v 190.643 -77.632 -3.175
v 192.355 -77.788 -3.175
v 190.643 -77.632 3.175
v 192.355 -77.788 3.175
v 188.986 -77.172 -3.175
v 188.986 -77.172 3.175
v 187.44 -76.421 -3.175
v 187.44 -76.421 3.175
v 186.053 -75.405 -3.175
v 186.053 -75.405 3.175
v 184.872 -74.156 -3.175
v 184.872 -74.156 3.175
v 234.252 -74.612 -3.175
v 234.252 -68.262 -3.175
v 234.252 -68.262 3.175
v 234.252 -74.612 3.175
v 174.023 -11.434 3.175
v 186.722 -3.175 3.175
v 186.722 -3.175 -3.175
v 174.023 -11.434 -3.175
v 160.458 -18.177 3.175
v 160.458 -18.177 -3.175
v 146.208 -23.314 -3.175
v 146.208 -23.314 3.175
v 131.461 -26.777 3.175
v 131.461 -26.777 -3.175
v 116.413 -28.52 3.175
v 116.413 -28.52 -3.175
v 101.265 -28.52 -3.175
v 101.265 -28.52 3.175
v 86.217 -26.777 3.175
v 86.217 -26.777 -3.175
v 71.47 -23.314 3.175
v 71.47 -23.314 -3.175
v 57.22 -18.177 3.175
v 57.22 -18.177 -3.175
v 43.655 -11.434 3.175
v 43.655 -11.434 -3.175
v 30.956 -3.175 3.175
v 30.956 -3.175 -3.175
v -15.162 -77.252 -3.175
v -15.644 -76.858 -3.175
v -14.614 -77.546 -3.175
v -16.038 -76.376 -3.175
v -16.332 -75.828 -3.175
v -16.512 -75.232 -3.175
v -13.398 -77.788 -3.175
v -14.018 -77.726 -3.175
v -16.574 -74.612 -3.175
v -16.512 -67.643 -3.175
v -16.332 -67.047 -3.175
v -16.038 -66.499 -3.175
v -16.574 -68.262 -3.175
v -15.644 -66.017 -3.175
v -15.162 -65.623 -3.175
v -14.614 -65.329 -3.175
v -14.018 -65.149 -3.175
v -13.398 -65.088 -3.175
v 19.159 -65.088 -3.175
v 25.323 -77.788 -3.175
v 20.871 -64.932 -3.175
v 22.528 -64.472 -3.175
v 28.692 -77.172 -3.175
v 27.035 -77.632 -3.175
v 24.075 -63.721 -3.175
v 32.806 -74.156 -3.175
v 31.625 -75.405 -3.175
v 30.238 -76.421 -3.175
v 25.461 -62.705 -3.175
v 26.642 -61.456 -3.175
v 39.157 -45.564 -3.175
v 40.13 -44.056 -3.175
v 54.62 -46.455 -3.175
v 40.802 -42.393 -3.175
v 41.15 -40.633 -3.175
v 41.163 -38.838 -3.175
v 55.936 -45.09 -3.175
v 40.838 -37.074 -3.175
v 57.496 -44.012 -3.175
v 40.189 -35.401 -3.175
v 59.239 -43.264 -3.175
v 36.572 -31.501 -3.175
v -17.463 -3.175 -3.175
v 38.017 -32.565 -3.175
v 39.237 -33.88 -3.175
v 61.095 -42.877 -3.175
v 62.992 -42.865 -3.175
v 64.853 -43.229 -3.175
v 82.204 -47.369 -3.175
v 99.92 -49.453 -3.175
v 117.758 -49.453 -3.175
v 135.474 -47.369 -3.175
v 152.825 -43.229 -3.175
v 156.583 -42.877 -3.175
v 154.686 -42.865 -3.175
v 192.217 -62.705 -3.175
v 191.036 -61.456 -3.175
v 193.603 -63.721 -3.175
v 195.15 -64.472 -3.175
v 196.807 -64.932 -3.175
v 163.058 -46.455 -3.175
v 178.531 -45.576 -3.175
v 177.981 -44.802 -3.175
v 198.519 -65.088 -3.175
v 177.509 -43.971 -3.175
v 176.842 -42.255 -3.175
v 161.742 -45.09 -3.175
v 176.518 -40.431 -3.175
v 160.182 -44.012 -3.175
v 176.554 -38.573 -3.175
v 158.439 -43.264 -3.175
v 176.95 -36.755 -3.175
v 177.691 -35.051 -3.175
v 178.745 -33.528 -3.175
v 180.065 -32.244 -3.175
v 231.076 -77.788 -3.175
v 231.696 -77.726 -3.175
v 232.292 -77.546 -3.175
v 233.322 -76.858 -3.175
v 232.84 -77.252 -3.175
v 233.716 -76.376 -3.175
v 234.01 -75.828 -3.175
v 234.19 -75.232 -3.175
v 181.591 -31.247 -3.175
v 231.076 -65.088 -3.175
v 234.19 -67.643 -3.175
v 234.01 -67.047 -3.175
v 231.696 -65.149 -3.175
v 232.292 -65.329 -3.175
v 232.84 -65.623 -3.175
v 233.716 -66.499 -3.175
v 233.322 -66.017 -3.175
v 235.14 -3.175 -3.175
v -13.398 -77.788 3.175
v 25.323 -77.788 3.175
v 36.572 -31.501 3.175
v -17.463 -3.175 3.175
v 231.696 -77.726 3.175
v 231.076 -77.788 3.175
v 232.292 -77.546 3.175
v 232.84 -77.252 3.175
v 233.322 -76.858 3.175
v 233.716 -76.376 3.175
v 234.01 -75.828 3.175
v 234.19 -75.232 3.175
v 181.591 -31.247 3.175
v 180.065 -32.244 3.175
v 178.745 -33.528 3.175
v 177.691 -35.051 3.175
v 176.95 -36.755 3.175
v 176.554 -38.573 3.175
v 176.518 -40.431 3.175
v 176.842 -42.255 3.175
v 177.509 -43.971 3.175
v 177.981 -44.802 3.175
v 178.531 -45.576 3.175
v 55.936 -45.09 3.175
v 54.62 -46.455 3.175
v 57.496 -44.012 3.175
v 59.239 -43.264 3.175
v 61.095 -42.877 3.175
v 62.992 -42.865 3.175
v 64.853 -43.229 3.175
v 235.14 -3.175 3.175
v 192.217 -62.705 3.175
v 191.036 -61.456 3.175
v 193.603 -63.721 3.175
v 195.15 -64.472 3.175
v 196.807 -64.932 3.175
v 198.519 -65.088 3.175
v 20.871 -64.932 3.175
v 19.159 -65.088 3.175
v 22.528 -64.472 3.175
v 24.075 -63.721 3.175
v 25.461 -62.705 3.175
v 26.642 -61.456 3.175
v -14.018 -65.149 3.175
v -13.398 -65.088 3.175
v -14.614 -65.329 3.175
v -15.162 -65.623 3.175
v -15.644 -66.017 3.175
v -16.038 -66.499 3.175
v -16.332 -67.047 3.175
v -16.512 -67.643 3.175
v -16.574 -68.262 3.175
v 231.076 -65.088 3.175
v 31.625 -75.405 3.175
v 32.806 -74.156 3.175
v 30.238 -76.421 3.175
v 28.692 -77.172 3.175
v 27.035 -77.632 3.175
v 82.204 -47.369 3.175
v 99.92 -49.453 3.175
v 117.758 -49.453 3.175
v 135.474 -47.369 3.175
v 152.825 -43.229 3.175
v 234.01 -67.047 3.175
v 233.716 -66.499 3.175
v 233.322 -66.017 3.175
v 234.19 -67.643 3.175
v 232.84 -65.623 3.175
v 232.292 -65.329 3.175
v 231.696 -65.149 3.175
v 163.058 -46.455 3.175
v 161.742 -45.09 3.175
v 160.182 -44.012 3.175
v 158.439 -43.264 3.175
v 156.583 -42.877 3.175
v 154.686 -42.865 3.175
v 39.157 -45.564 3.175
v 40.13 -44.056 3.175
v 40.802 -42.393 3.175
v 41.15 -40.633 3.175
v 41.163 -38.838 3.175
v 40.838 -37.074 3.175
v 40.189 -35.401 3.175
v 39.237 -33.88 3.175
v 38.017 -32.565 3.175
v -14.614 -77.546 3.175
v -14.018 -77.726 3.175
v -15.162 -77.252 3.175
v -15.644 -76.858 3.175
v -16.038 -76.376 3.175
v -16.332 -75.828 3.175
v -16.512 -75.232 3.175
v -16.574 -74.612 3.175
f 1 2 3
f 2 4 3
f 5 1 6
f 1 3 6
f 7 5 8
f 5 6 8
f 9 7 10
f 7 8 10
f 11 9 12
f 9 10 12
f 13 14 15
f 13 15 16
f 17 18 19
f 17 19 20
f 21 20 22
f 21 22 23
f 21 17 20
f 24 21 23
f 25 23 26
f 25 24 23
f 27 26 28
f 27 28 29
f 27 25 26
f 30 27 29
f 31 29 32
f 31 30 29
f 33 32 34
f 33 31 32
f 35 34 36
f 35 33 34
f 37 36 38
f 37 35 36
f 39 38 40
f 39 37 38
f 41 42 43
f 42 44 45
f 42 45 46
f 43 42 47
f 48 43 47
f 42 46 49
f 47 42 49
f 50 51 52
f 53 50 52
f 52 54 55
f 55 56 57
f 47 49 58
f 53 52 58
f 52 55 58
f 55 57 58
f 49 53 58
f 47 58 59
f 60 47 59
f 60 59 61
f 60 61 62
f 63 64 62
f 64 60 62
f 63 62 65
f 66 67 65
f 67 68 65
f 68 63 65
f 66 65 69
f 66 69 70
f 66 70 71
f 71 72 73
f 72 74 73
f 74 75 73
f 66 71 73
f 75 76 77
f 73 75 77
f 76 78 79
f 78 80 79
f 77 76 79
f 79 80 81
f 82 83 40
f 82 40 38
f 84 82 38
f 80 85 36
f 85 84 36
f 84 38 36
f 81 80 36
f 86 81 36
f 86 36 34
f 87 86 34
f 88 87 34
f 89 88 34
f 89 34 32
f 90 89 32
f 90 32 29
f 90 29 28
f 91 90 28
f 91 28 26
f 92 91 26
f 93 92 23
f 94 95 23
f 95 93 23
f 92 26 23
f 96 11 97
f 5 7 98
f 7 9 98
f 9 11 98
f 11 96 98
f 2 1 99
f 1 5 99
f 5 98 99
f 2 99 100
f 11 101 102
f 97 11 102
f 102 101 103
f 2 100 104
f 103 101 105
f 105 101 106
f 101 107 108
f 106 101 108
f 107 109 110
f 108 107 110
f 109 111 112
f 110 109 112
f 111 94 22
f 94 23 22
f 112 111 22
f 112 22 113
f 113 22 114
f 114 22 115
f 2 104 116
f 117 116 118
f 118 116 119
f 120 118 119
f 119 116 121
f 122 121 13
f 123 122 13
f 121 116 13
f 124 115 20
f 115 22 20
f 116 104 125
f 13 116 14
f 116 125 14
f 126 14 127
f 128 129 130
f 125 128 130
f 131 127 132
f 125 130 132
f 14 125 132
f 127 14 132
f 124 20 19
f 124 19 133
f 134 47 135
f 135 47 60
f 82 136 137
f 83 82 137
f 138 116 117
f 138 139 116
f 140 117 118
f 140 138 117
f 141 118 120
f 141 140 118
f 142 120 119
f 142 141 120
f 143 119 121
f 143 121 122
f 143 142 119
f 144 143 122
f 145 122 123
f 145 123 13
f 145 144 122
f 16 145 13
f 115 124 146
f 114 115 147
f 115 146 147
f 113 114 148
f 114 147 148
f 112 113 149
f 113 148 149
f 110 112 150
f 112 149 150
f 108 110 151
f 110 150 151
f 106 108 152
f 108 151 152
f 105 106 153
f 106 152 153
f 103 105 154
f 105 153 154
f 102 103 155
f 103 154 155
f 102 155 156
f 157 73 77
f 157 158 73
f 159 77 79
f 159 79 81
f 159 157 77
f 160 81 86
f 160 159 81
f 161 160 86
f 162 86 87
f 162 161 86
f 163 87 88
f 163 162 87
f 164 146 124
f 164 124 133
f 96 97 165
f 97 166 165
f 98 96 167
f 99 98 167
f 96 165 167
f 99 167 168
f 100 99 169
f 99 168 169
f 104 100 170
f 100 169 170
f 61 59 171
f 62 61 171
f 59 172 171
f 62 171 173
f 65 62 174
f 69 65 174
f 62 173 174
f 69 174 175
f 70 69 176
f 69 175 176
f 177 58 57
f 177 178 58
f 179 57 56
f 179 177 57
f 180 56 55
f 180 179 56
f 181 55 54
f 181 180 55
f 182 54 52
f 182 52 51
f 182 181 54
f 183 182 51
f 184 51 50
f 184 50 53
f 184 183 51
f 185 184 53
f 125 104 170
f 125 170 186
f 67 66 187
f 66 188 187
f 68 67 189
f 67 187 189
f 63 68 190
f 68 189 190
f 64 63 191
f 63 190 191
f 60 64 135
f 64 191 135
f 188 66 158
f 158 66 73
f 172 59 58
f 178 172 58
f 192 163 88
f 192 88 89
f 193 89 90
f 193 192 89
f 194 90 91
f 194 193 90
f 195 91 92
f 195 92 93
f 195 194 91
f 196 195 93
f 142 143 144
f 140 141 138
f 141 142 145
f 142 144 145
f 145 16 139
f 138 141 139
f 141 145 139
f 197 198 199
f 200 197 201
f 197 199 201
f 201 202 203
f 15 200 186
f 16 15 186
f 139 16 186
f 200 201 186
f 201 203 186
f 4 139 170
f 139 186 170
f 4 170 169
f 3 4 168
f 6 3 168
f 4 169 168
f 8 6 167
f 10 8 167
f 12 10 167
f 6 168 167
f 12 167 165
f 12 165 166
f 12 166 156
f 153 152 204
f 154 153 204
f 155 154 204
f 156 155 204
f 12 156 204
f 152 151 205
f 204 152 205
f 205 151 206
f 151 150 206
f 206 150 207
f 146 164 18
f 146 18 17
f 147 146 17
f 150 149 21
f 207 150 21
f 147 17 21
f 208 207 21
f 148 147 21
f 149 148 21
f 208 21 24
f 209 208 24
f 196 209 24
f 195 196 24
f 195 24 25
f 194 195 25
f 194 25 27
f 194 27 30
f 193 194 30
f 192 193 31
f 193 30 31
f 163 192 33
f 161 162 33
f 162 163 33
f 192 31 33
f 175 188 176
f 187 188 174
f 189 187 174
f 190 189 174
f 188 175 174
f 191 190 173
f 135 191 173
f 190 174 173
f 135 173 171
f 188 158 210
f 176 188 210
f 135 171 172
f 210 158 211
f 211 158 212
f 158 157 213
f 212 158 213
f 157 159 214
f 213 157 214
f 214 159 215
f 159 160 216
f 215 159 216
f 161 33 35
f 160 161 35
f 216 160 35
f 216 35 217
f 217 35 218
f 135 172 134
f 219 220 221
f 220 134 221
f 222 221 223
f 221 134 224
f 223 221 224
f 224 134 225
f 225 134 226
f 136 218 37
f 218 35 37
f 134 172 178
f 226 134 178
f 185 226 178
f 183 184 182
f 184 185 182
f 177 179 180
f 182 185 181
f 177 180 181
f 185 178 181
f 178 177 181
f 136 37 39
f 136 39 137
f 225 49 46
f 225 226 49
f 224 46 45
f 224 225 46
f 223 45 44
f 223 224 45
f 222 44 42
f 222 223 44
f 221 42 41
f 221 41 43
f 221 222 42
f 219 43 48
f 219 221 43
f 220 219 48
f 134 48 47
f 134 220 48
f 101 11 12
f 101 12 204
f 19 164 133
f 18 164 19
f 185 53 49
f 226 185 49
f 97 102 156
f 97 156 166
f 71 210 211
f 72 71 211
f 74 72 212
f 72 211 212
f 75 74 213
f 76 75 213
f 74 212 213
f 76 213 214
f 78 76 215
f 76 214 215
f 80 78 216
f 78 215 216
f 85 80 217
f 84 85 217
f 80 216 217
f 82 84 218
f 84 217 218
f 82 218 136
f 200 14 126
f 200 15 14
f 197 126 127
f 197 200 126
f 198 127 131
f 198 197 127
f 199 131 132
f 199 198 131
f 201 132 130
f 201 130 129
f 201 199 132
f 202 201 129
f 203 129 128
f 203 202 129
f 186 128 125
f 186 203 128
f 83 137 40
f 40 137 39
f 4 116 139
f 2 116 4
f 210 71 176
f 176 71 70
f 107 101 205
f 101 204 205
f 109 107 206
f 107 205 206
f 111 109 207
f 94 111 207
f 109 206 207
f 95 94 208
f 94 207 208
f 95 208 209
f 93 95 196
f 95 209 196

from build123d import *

# Parameters (mm, degrees)
EXTRUDE1_DEPTH       = 3.175
EXTRUDE2_DEPTH       = 6.35
EXTRUDE3_DEPTH       = 6.35
FILLET1_R            = 9.525
FILLET2_R            = 3.175
FILLET1_OF_MIRROR1_R = 9.525
FILLET2_OF_MIRROR1_R = 3.175


with BuildPart() as part:
    # Sketch1 → Extrude1 (new body, symmetric)
    with BuildSketch(Plane.XY):
        with BuildLine():
            Line((218.47175, -3.175), (186.72175, -3.175))
            ThreePointArc((186.72175, -3.175), (108.839, -28.738144468), (30.95625, -3.175))
            Line((30.95625, -3.175), (-0.79375, -3.175))
            ThreePointArc((-0.79375, -3.175), (108.839, -49.714619652), (218.47175, -3.175))
        make_face()
    extrude(amount=EXTRUDE1_DEPTH, both=True)

    # Sketch2 → Extrude2 (add)
    with BuildSketch(Plane(origin=(0, 0, -3.175), x_dir=(-1, 0, 0), z_dir=(0, 0, -1))):
        with BuildLine():
            Line((16.5735, -77.7875), (-29.946040711, -77.7875))
            Line((-29.946040711, -77.7875), (-58.727389514, -41.240247997))
            ThreePointArc((-58.727389514, -41.240247997), (-52.51922119, -38.926209978), (-46.417495888, -36.344529471))
            Line((-46.417495888, -36.344529471), (-23.782101567, -65.0875))
            Line((-23.782101567, -65.0875), (16.5735, -65.0875))
            Line((16.5735, -65.0875), (16.5735, -77.7875))
        make_face()
    extrude2 = extrude(amount=-EXTRUDE2_DEPTH)

    # Sketch3 → Extrude3 (add)
    with BuildSketch(Plane.XY.offset(3.175)):
        with BuildLine():
            Line((179.598329003, -32.291941299), (235.1405, -3.175))
            Line((235.1405, -3.175), (218.47175, -3.175))
            ThreePointArc((218.47175, -3.175), (200.202420522, -19.2920167), (179.598329003, -32.291941299))
        make_face()
    extrude3 = extrude(amount=-EXTRUDE3_DEPTH)

    # Fillet1
    fillet1_edges = [part.edges().sort_by_distance(p)[0] for p in [
        (29.946040711, -77.7875, 0),
        (58.727389514, -41.240247997, 0),
        (46.417495888, -36.344529471, 0),
        (23.782101567, -65.0875, 0),
    ]]
    fillet(fillet1_edges, radius=FILLET1_R)

    # Fillet2
    fillet2_edges = [part.edges().sort_by_distance(p)[0] for p in [
        (-16.5735, -65.0875, 0),
        (-16.5735, -77.7875, 0),
    ]]
    fillet(fillet2_edges, radius=FILLET2_R)

    # Mirror1: Extrude2, Extrude3 across plane
    add(extrude2.mirror(Plane(origin=(108.839, 0, 0), x_dir=(0, 0, 1), z_dir=(1, 0, 0))))
    add(extrude3.mirror(Plane(origin=(108.839, 0, 0), x_dir=(0, 0, 1), z_dir=(1, 0, 0))))

    # Fillet1 of Mirror1
    fillet1_of_mirror1_edges = [part.edges().sort_by_distance(p)[0] for p in [
        (187.731959289, -77.7875, 0),
        (158.950610486, -41.240247997, 0),
        (171.260504112, -36.344529471, 0),
        (193.895898433, -65.0875, 0),
    ]]
    fillet(fillet1_of_mirror1_edges, radius=FILLET1_OF_MIRROR1_R)

    # Fillet2 of Mirror1
    fillet2_of_mirror1_edges = [part.edges().sort_by_distance(p)[0] for p in [
        (234.2515, -65.0875, 0),
        (234.2515, -77.7875, 0),
    ]]
    fillet(fillet2_of_mirror1_edges, radius=FILLET2_OF_MIRROR1_R)


solid = part.part
